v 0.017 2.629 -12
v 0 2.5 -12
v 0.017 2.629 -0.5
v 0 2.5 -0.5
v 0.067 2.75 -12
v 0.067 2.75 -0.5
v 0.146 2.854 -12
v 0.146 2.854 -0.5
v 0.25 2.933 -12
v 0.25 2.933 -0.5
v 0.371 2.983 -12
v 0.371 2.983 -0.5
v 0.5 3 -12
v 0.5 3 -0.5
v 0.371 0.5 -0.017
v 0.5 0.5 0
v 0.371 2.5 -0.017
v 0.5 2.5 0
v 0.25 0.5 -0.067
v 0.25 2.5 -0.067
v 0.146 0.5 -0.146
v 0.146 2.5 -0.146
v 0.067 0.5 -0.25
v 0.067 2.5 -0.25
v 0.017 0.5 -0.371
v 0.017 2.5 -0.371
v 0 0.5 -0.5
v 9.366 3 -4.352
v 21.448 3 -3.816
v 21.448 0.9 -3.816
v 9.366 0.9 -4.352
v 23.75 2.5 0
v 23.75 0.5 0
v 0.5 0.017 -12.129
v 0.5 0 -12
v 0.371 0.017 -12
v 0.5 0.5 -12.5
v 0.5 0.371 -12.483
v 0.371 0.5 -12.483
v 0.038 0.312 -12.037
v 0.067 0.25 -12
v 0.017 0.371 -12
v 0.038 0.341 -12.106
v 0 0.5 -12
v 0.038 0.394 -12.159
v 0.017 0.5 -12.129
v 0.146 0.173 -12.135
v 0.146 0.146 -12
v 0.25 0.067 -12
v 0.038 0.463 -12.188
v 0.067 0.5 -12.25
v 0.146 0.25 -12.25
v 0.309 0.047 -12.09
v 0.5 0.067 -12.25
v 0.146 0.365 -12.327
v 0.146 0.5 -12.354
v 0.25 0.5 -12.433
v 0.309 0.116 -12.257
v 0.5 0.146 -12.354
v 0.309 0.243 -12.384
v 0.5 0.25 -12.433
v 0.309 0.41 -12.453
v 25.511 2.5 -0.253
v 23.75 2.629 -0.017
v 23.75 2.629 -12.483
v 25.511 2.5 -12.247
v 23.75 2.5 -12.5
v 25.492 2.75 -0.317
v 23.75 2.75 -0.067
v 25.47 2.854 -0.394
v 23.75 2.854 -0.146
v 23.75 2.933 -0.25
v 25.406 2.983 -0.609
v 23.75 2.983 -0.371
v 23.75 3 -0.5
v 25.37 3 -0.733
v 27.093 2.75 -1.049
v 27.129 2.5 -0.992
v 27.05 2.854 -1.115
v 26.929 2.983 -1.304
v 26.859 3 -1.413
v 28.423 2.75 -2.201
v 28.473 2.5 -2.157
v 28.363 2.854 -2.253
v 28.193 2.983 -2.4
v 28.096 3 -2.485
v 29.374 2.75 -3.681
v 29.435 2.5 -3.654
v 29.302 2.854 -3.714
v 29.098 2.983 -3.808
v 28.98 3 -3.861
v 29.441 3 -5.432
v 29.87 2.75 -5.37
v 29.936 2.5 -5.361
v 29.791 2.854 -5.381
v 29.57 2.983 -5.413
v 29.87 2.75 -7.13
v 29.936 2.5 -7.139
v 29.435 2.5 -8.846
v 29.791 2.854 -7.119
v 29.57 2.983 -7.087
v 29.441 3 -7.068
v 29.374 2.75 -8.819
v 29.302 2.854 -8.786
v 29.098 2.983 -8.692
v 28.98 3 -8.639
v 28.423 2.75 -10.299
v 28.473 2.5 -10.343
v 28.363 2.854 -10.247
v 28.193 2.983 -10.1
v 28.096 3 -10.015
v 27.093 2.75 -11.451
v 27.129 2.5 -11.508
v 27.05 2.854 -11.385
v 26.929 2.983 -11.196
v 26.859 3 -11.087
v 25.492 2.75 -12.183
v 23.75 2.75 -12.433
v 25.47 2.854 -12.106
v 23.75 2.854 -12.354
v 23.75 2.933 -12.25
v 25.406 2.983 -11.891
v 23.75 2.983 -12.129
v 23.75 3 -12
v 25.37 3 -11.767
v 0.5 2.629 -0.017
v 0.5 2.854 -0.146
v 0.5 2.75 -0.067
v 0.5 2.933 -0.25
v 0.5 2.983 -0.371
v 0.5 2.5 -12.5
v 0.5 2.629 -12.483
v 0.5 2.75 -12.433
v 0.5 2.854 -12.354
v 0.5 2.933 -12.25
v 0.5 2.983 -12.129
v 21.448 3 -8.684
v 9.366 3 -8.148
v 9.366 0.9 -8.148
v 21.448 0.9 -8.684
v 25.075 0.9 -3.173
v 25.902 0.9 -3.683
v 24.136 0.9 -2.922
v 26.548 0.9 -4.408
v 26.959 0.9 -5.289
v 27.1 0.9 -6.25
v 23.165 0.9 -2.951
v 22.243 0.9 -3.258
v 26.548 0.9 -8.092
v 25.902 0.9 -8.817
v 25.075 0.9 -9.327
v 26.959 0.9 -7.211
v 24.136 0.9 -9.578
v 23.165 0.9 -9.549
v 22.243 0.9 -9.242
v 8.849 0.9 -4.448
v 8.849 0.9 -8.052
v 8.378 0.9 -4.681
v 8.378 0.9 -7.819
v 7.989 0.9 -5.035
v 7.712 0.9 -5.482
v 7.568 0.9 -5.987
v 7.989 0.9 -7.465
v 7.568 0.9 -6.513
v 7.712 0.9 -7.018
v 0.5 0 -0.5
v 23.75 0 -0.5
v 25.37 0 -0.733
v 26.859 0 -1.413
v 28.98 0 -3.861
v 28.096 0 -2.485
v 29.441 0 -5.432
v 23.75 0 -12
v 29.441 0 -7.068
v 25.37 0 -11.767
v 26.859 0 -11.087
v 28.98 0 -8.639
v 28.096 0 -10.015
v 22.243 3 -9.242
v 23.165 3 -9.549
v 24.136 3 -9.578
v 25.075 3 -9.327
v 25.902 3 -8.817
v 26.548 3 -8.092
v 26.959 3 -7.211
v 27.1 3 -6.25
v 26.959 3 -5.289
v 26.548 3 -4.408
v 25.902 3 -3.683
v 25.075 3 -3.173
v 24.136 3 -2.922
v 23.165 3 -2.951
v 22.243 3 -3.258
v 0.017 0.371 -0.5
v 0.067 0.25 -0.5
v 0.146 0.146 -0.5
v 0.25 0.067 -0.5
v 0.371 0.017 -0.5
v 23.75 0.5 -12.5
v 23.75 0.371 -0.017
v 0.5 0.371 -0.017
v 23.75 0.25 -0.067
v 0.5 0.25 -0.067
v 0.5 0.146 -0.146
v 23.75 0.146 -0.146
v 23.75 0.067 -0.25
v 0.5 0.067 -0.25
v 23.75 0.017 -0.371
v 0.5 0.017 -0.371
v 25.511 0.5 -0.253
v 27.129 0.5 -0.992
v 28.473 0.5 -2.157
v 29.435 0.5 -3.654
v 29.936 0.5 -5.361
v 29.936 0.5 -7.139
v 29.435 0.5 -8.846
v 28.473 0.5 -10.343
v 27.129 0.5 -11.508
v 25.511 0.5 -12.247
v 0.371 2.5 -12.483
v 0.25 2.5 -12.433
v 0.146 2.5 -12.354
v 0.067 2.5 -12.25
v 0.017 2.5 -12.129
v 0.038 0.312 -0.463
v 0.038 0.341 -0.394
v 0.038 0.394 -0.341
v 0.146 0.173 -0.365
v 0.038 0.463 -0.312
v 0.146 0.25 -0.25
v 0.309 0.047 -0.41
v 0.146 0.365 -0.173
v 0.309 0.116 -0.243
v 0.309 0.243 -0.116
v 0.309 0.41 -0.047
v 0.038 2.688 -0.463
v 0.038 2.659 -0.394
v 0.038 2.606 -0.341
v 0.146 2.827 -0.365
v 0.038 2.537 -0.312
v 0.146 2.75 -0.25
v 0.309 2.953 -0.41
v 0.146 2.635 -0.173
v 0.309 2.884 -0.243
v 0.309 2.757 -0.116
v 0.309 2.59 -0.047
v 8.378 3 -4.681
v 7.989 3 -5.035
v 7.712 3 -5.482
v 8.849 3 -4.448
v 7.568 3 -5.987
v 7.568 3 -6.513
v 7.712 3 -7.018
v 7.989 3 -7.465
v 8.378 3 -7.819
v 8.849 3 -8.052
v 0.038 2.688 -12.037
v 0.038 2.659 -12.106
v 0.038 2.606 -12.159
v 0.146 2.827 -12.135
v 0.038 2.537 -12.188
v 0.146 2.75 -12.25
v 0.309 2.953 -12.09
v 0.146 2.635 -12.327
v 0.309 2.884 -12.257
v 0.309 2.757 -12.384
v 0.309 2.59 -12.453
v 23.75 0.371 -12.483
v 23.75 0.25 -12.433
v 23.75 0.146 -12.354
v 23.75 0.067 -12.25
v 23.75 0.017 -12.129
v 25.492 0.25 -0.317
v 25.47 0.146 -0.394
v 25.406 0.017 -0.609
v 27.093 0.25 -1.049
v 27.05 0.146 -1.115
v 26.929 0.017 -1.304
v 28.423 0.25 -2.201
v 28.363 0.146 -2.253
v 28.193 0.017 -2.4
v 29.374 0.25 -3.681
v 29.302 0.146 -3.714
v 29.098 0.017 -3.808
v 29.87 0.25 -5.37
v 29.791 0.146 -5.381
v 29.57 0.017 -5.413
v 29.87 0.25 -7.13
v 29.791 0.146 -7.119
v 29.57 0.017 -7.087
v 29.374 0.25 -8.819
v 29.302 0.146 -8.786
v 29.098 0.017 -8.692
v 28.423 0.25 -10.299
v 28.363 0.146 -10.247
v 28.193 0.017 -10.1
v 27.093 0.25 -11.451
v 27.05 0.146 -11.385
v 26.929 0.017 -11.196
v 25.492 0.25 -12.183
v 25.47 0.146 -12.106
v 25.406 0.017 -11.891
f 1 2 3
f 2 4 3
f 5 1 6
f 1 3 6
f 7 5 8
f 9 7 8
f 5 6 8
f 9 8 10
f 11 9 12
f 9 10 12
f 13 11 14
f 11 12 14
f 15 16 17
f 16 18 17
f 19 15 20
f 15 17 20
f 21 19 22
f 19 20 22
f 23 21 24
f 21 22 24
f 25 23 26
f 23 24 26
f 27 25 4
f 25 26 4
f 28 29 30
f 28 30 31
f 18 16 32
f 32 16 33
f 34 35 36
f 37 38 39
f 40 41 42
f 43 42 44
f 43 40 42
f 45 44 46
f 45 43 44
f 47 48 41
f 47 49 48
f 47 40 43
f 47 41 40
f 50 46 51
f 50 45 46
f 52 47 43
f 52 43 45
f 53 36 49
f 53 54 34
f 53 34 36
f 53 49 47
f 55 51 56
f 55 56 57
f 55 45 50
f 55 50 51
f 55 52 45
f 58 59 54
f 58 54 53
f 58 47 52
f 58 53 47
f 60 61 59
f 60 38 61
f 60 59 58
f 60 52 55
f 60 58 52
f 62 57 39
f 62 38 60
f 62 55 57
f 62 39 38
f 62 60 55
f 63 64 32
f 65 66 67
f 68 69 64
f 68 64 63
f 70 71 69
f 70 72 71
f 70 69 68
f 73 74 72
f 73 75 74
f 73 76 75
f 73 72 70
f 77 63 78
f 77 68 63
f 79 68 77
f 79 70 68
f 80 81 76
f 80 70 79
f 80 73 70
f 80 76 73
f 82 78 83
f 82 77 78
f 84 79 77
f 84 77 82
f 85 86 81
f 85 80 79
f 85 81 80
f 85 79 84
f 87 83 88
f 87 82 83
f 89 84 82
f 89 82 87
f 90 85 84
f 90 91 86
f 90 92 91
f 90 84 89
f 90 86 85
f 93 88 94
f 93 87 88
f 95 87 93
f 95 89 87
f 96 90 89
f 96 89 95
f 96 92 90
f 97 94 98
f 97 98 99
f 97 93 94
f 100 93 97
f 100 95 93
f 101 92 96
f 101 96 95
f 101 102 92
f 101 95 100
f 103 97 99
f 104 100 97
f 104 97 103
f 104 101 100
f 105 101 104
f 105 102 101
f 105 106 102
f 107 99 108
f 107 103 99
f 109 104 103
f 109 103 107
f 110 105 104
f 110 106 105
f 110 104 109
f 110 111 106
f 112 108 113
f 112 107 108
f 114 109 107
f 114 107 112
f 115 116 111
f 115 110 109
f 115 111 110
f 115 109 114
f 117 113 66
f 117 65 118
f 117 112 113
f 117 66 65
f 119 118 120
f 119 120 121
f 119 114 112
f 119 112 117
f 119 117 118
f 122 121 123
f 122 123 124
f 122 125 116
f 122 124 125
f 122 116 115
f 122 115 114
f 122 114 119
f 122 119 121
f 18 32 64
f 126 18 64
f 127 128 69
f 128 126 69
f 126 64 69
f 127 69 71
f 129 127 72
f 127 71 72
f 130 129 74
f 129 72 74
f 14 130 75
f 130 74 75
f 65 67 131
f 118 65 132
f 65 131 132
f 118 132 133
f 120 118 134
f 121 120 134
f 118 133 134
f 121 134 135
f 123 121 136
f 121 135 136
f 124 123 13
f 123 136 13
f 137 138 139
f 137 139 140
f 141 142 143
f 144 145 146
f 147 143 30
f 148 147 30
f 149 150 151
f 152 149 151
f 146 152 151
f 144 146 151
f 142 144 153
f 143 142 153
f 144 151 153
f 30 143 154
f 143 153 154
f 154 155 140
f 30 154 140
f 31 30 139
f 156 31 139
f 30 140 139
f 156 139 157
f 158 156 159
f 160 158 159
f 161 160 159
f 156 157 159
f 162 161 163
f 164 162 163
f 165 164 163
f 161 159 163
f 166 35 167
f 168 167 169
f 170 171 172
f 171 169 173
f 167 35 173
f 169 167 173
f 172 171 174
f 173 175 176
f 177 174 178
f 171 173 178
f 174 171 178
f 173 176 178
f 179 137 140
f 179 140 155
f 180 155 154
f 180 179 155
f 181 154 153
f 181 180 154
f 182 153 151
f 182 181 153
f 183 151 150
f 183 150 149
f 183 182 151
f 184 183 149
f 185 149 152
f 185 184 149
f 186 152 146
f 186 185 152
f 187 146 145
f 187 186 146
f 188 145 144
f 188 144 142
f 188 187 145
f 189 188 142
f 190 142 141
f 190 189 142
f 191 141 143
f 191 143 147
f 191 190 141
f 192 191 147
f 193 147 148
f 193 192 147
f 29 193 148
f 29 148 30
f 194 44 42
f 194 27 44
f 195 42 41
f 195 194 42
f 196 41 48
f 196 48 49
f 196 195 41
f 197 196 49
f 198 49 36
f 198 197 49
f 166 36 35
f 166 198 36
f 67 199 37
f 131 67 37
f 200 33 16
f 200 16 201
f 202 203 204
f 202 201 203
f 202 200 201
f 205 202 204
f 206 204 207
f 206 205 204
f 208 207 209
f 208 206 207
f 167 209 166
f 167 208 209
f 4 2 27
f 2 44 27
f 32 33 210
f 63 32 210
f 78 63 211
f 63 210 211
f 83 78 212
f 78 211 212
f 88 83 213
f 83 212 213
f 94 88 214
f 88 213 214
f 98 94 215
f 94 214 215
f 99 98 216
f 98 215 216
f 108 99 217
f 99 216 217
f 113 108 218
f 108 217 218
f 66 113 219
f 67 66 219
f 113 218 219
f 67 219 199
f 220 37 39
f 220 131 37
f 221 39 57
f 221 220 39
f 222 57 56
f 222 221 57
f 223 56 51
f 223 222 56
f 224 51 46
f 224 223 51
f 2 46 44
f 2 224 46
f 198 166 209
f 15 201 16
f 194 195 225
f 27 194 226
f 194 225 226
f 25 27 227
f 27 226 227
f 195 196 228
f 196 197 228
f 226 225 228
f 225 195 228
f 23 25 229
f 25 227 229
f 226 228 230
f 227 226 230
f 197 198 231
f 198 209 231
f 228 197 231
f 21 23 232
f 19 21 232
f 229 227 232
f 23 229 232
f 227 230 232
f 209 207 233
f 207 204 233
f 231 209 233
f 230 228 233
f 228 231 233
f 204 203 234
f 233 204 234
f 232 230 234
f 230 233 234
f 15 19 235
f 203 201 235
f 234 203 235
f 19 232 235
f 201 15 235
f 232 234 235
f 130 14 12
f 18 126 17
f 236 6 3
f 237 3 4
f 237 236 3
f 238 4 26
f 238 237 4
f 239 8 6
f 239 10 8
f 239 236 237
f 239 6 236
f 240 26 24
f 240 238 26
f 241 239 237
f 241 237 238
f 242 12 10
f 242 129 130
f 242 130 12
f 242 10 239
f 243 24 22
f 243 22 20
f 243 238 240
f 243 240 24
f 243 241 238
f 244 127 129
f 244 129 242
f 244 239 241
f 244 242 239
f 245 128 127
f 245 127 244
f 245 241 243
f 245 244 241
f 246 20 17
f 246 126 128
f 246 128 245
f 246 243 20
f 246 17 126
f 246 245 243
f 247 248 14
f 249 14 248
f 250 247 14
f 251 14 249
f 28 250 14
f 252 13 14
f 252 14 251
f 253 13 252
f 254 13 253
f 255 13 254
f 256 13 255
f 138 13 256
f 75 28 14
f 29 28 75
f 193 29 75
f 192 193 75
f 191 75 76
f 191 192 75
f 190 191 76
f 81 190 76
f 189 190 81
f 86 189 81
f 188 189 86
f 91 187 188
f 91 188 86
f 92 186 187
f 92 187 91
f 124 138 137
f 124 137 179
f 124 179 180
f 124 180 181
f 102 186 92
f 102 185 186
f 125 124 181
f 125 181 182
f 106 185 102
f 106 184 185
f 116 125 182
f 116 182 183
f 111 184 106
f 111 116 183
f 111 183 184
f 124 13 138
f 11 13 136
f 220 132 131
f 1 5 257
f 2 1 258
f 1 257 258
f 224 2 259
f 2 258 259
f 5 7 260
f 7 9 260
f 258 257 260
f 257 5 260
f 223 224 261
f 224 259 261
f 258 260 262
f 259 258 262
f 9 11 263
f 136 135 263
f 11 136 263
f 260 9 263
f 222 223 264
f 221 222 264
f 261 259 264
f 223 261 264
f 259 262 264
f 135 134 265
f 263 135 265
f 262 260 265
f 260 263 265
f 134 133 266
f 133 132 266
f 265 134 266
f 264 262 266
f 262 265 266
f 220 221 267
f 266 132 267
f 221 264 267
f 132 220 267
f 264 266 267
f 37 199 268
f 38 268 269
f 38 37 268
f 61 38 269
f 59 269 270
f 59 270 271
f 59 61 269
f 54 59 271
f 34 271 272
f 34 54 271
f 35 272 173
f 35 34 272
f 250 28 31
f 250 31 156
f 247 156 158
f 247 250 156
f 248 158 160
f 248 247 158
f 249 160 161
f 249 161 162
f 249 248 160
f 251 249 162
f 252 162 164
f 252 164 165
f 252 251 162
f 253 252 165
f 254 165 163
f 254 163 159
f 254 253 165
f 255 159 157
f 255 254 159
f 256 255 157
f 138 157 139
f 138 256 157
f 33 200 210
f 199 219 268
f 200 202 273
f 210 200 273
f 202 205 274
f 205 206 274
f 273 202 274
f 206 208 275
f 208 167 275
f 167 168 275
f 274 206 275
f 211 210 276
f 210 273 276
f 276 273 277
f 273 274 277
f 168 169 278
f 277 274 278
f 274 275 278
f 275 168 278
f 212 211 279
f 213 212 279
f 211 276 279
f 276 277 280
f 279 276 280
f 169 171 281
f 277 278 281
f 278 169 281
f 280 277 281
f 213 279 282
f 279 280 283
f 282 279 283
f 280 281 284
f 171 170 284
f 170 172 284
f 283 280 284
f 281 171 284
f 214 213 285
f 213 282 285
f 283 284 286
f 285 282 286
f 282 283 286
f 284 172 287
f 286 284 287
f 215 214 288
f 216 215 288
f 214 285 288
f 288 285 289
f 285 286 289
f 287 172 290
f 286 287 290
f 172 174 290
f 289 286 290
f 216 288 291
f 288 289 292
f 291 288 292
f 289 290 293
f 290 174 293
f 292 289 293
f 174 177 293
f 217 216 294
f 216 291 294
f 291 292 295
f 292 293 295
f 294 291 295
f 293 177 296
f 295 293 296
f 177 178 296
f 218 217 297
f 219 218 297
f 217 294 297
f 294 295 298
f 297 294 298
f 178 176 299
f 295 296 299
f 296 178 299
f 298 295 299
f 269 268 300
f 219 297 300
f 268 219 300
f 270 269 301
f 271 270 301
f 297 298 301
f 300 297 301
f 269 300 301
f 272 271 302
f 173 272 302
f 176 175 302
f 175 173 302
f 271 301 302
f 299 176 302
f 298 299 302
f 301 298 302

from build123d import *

# Parameters (mm, degrees)
EXTRUDE_1_DEPTH     = 3
FILLET_1_R          = 0.5
CUT_EXTRUDE_1_DEPTH = 2.1


with BuildPart() as part:
    # 草图1 → 凸台-拉伸1 (new body)
    with BuildSketch(Plane(origin=(0, 0, 0), x_dir=(1, 0, 0), z_dir=(0, 1, 0))):
        with BuildLine():
            Line((0, 0), (23.75, 0))
            ThreePointArc((23.75, 0), (30, 6.25), (23.75, 12.5))
            Line((23.75, 12.5), (0, 12.5))
            Line((0, 12.5), (0, 0))
        make_face()
    extrude(amount=EXTRUDE_1_DEPTH)

    # 圆角1
    fillet_1_edges = [part.edges().sort_by_distance(p)[0] for p in [
        (30, 3, -6.25),
        (11.875, 3, -12.5),
        (0, 3, -6.25),
        (11.875, 0, -12.5),
        (30, 0, -6.25),
        (11.875, 0, 0),
        (0, 0, -6.25),
        (0, 1.5, -12.5),
        (0, 1.5, 0),
        (11.875, 3, 0),
    ]]
    fillet(fillet_1_edges, radius=FILLET_1_R)

    # 草图2 → 切除-拉伸1 (cut)
    with BuildSketch(Plane(origin=(0, 3, 0), x_dir=(1, 0, 0), z_dir=(0, 1, 0))):
        with BuildLine():
            Line((9.365836637, 8.148135013), (21.448084588, 8.683862246))
            ThreePointArc((21.448084588, 8.683862246), (27.1, 6.25), (21.448084588, 3.816137754))
            Line((21.448084588, 3.816137754), (9.365836637, 4.351864987))
            ThreePointArc((9.365836637, 4.351864987), (7.55, 6.25), (9.365836637, 8.148135013))
        make_face()
    extrude(amount=-CUT_EXTRUDE_1_DEPTH, mode=Mode.SUBTRACT)


solid = part.part
